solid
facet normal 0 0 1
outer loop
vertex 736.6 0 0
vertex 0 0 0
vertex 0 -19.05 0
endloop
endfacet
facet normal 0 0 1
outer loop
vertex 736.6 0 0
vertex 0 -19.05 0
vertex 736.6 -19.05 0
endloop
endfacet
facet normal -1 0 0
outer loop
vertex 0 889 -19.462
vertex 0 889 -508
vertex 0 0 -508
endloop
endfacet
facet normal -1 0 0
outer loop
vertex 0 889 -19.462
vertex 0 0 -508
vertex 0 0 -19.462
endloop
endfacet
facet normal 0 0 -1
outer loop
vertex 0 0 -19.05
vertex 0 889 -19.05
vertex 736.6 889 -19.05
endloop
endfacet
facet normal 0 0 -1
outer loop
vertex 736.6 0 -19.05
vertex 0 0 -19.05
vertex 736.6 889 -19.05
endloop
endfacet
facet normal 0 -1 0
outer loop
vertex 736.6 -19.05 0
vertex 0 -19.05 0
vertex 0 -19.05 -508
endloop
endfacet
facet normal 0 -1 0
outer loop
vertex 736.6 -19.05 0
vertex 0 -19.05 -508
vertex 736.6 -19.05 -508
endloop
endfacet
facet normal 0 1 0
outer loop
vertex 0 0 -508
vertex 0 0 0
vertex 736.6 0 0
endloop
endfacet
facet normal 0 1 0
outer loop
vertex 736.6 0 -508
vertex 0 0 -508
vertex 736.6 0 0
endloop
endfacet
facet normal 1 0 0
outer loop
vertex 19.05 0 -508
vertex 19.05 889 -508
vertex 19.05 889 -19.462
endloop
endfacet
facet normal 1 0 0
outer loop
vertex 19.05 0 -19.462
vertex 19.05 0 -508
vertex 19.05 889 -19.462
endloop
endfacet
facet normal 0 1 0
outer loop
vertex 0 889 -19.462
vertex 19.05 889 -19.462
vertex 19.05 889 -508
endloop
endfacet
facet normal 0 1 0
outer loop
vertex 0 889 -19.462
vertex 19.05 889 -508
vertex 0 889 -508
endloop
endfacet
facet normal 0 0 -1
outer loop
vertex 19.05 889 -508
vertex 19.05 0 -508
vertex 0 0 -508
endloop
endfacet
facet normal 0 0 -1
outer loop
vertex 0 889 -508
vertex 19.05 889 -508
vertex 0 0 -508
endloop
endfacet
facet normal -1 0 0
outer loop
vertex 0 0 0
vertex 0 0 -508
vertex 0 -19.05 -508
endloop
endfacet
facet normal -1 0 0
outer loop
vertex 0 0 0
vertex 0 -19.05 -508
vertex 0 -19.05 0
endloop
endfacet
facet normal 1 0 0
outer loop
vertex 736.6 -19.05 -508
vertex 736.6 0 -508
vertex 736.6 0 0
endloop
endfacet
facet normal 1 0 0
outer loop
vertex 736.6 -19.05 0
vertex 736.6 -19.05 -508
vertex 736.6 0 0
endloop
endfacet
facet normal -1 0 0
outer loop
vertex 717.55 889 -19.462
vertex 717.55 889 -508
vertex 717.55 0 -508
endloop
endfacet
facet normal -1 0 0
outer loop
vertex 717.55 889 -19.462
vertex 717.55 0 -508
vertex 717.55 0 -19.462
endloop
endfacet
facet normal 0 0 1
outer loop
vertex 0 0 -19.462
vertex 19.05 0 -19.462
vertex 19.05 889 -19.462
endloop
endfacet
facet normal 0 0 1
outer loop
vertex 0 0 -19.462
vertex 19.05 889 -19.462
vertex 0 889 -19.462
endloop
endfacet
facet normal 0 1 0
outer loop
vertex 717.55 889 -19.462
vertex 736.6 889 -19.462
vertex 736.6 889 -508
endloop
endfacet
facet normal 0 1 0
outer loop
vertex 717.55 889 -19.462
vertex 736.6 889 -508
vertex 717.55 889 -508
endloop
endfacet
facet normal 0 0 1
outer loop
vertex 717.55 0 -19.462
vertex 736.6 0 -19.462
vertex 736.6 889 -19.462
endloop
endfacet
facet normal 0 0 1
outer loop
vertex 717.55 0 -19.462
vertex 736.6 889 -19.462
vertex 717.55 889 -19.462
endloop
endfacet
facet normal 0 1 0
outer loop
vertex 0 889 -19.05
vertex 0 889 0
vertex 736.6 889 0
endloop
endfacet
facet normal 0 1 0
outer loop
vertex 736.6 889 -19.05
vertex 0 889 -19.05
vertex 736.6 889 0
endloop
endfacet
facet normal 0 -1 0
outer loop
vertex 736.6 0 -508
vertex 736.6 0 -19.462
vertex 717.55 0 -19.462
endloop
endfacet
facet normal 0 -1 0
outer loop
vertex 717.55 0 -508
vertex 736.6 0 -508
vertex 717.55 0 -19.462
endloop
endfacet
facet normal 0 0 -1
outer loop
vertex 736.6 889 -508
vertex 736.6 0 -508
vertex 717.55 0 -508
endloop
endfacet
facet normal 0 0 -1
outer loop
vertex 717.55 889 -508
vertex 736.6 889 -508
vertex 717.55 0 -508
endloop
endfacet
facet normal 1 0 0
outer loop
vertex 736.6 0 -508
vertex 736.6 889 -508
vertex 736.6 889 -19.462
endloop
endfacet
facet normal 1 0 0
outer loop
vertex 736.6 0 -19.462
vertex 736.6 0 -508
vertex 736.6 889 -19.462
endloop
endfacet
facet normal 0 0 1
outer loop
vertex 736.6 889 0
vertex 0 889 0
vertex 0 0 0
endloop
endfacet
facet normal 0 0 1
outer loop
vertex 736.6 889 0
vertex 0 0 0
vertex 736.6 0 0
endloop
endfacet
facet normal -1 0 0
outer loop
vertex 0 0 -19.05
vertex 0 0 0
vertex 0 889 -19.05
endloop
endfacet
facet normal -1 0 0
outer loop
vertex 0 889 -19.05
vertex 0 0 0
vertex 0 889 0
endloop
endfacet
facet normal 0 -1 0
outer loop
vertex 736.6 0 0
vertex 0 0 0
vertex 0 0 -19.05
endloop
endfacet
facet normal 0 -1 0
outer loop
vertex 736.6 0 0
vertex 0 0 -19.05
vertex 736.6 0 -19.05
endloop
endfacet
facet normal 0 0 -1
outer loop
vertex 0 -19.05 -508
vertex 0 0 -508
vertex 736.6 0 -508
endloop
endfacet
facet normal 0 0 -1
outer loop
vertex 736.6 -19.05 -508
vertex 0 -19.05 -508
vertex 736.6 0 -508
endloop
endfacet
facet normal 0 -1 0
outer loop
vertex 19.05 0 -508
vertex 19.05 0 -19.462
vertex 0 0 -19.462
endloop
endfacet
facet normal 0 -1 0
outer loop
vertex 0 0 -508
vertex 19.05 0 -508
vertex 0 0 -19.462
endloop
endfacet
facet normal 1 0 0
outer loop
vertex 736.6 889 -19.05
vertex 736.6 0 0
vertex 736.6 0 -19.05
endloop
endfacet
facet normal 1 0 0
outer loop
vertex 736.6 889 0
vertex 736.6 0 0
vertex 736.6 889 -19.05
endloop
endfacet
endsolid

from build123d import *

# Parameters (mm, degrees)
F0_W     = 736.6
F0_H     = 889
F1_DEPTH = 19.05
F2_W     = 736.6
F2_H     = 508
F3_DEPTH = 19.05
F4_W     = 19.05
F4_H     = 488.538212
F5_DEPTH = 889


with BuildPart() as f1:
    # F0 (on Top) → F1 (new body)
    with BuildSketch(Plane.XY):
        with Locations((368.3, 444.5)):
            Rectangle(F0_W, F0_H)
    extrude(amount=-F1_DEPTH)


with BuildPart() as f3:
    # F2 (on face) → F3 (new body)
    with BuildSketch(Plane.XZ):
        with Locations((368.3, -254)):
            Rectangle(F2_W, F2_H)
    extrude(amount=F3_DEPTH)


with BuildPart() as f5:
    # F4 (on face) → F5 (new body)
    with BuildSketch(Plane(origin=(0, 0, 0), x_dir=(-1, 0, 0), z_dir=(0, 1, 0))):
        with Locations((-9.525, -263.730894)):
            Rectangle(F4_W, F4_H)
        with Locations((-727.075, -263.730894)):
            Rectangle(F4_W, F4_H)
    extrude(amount=F5_DEPTH)


solid = Compound([f1.part, f3.part, f5.part])
